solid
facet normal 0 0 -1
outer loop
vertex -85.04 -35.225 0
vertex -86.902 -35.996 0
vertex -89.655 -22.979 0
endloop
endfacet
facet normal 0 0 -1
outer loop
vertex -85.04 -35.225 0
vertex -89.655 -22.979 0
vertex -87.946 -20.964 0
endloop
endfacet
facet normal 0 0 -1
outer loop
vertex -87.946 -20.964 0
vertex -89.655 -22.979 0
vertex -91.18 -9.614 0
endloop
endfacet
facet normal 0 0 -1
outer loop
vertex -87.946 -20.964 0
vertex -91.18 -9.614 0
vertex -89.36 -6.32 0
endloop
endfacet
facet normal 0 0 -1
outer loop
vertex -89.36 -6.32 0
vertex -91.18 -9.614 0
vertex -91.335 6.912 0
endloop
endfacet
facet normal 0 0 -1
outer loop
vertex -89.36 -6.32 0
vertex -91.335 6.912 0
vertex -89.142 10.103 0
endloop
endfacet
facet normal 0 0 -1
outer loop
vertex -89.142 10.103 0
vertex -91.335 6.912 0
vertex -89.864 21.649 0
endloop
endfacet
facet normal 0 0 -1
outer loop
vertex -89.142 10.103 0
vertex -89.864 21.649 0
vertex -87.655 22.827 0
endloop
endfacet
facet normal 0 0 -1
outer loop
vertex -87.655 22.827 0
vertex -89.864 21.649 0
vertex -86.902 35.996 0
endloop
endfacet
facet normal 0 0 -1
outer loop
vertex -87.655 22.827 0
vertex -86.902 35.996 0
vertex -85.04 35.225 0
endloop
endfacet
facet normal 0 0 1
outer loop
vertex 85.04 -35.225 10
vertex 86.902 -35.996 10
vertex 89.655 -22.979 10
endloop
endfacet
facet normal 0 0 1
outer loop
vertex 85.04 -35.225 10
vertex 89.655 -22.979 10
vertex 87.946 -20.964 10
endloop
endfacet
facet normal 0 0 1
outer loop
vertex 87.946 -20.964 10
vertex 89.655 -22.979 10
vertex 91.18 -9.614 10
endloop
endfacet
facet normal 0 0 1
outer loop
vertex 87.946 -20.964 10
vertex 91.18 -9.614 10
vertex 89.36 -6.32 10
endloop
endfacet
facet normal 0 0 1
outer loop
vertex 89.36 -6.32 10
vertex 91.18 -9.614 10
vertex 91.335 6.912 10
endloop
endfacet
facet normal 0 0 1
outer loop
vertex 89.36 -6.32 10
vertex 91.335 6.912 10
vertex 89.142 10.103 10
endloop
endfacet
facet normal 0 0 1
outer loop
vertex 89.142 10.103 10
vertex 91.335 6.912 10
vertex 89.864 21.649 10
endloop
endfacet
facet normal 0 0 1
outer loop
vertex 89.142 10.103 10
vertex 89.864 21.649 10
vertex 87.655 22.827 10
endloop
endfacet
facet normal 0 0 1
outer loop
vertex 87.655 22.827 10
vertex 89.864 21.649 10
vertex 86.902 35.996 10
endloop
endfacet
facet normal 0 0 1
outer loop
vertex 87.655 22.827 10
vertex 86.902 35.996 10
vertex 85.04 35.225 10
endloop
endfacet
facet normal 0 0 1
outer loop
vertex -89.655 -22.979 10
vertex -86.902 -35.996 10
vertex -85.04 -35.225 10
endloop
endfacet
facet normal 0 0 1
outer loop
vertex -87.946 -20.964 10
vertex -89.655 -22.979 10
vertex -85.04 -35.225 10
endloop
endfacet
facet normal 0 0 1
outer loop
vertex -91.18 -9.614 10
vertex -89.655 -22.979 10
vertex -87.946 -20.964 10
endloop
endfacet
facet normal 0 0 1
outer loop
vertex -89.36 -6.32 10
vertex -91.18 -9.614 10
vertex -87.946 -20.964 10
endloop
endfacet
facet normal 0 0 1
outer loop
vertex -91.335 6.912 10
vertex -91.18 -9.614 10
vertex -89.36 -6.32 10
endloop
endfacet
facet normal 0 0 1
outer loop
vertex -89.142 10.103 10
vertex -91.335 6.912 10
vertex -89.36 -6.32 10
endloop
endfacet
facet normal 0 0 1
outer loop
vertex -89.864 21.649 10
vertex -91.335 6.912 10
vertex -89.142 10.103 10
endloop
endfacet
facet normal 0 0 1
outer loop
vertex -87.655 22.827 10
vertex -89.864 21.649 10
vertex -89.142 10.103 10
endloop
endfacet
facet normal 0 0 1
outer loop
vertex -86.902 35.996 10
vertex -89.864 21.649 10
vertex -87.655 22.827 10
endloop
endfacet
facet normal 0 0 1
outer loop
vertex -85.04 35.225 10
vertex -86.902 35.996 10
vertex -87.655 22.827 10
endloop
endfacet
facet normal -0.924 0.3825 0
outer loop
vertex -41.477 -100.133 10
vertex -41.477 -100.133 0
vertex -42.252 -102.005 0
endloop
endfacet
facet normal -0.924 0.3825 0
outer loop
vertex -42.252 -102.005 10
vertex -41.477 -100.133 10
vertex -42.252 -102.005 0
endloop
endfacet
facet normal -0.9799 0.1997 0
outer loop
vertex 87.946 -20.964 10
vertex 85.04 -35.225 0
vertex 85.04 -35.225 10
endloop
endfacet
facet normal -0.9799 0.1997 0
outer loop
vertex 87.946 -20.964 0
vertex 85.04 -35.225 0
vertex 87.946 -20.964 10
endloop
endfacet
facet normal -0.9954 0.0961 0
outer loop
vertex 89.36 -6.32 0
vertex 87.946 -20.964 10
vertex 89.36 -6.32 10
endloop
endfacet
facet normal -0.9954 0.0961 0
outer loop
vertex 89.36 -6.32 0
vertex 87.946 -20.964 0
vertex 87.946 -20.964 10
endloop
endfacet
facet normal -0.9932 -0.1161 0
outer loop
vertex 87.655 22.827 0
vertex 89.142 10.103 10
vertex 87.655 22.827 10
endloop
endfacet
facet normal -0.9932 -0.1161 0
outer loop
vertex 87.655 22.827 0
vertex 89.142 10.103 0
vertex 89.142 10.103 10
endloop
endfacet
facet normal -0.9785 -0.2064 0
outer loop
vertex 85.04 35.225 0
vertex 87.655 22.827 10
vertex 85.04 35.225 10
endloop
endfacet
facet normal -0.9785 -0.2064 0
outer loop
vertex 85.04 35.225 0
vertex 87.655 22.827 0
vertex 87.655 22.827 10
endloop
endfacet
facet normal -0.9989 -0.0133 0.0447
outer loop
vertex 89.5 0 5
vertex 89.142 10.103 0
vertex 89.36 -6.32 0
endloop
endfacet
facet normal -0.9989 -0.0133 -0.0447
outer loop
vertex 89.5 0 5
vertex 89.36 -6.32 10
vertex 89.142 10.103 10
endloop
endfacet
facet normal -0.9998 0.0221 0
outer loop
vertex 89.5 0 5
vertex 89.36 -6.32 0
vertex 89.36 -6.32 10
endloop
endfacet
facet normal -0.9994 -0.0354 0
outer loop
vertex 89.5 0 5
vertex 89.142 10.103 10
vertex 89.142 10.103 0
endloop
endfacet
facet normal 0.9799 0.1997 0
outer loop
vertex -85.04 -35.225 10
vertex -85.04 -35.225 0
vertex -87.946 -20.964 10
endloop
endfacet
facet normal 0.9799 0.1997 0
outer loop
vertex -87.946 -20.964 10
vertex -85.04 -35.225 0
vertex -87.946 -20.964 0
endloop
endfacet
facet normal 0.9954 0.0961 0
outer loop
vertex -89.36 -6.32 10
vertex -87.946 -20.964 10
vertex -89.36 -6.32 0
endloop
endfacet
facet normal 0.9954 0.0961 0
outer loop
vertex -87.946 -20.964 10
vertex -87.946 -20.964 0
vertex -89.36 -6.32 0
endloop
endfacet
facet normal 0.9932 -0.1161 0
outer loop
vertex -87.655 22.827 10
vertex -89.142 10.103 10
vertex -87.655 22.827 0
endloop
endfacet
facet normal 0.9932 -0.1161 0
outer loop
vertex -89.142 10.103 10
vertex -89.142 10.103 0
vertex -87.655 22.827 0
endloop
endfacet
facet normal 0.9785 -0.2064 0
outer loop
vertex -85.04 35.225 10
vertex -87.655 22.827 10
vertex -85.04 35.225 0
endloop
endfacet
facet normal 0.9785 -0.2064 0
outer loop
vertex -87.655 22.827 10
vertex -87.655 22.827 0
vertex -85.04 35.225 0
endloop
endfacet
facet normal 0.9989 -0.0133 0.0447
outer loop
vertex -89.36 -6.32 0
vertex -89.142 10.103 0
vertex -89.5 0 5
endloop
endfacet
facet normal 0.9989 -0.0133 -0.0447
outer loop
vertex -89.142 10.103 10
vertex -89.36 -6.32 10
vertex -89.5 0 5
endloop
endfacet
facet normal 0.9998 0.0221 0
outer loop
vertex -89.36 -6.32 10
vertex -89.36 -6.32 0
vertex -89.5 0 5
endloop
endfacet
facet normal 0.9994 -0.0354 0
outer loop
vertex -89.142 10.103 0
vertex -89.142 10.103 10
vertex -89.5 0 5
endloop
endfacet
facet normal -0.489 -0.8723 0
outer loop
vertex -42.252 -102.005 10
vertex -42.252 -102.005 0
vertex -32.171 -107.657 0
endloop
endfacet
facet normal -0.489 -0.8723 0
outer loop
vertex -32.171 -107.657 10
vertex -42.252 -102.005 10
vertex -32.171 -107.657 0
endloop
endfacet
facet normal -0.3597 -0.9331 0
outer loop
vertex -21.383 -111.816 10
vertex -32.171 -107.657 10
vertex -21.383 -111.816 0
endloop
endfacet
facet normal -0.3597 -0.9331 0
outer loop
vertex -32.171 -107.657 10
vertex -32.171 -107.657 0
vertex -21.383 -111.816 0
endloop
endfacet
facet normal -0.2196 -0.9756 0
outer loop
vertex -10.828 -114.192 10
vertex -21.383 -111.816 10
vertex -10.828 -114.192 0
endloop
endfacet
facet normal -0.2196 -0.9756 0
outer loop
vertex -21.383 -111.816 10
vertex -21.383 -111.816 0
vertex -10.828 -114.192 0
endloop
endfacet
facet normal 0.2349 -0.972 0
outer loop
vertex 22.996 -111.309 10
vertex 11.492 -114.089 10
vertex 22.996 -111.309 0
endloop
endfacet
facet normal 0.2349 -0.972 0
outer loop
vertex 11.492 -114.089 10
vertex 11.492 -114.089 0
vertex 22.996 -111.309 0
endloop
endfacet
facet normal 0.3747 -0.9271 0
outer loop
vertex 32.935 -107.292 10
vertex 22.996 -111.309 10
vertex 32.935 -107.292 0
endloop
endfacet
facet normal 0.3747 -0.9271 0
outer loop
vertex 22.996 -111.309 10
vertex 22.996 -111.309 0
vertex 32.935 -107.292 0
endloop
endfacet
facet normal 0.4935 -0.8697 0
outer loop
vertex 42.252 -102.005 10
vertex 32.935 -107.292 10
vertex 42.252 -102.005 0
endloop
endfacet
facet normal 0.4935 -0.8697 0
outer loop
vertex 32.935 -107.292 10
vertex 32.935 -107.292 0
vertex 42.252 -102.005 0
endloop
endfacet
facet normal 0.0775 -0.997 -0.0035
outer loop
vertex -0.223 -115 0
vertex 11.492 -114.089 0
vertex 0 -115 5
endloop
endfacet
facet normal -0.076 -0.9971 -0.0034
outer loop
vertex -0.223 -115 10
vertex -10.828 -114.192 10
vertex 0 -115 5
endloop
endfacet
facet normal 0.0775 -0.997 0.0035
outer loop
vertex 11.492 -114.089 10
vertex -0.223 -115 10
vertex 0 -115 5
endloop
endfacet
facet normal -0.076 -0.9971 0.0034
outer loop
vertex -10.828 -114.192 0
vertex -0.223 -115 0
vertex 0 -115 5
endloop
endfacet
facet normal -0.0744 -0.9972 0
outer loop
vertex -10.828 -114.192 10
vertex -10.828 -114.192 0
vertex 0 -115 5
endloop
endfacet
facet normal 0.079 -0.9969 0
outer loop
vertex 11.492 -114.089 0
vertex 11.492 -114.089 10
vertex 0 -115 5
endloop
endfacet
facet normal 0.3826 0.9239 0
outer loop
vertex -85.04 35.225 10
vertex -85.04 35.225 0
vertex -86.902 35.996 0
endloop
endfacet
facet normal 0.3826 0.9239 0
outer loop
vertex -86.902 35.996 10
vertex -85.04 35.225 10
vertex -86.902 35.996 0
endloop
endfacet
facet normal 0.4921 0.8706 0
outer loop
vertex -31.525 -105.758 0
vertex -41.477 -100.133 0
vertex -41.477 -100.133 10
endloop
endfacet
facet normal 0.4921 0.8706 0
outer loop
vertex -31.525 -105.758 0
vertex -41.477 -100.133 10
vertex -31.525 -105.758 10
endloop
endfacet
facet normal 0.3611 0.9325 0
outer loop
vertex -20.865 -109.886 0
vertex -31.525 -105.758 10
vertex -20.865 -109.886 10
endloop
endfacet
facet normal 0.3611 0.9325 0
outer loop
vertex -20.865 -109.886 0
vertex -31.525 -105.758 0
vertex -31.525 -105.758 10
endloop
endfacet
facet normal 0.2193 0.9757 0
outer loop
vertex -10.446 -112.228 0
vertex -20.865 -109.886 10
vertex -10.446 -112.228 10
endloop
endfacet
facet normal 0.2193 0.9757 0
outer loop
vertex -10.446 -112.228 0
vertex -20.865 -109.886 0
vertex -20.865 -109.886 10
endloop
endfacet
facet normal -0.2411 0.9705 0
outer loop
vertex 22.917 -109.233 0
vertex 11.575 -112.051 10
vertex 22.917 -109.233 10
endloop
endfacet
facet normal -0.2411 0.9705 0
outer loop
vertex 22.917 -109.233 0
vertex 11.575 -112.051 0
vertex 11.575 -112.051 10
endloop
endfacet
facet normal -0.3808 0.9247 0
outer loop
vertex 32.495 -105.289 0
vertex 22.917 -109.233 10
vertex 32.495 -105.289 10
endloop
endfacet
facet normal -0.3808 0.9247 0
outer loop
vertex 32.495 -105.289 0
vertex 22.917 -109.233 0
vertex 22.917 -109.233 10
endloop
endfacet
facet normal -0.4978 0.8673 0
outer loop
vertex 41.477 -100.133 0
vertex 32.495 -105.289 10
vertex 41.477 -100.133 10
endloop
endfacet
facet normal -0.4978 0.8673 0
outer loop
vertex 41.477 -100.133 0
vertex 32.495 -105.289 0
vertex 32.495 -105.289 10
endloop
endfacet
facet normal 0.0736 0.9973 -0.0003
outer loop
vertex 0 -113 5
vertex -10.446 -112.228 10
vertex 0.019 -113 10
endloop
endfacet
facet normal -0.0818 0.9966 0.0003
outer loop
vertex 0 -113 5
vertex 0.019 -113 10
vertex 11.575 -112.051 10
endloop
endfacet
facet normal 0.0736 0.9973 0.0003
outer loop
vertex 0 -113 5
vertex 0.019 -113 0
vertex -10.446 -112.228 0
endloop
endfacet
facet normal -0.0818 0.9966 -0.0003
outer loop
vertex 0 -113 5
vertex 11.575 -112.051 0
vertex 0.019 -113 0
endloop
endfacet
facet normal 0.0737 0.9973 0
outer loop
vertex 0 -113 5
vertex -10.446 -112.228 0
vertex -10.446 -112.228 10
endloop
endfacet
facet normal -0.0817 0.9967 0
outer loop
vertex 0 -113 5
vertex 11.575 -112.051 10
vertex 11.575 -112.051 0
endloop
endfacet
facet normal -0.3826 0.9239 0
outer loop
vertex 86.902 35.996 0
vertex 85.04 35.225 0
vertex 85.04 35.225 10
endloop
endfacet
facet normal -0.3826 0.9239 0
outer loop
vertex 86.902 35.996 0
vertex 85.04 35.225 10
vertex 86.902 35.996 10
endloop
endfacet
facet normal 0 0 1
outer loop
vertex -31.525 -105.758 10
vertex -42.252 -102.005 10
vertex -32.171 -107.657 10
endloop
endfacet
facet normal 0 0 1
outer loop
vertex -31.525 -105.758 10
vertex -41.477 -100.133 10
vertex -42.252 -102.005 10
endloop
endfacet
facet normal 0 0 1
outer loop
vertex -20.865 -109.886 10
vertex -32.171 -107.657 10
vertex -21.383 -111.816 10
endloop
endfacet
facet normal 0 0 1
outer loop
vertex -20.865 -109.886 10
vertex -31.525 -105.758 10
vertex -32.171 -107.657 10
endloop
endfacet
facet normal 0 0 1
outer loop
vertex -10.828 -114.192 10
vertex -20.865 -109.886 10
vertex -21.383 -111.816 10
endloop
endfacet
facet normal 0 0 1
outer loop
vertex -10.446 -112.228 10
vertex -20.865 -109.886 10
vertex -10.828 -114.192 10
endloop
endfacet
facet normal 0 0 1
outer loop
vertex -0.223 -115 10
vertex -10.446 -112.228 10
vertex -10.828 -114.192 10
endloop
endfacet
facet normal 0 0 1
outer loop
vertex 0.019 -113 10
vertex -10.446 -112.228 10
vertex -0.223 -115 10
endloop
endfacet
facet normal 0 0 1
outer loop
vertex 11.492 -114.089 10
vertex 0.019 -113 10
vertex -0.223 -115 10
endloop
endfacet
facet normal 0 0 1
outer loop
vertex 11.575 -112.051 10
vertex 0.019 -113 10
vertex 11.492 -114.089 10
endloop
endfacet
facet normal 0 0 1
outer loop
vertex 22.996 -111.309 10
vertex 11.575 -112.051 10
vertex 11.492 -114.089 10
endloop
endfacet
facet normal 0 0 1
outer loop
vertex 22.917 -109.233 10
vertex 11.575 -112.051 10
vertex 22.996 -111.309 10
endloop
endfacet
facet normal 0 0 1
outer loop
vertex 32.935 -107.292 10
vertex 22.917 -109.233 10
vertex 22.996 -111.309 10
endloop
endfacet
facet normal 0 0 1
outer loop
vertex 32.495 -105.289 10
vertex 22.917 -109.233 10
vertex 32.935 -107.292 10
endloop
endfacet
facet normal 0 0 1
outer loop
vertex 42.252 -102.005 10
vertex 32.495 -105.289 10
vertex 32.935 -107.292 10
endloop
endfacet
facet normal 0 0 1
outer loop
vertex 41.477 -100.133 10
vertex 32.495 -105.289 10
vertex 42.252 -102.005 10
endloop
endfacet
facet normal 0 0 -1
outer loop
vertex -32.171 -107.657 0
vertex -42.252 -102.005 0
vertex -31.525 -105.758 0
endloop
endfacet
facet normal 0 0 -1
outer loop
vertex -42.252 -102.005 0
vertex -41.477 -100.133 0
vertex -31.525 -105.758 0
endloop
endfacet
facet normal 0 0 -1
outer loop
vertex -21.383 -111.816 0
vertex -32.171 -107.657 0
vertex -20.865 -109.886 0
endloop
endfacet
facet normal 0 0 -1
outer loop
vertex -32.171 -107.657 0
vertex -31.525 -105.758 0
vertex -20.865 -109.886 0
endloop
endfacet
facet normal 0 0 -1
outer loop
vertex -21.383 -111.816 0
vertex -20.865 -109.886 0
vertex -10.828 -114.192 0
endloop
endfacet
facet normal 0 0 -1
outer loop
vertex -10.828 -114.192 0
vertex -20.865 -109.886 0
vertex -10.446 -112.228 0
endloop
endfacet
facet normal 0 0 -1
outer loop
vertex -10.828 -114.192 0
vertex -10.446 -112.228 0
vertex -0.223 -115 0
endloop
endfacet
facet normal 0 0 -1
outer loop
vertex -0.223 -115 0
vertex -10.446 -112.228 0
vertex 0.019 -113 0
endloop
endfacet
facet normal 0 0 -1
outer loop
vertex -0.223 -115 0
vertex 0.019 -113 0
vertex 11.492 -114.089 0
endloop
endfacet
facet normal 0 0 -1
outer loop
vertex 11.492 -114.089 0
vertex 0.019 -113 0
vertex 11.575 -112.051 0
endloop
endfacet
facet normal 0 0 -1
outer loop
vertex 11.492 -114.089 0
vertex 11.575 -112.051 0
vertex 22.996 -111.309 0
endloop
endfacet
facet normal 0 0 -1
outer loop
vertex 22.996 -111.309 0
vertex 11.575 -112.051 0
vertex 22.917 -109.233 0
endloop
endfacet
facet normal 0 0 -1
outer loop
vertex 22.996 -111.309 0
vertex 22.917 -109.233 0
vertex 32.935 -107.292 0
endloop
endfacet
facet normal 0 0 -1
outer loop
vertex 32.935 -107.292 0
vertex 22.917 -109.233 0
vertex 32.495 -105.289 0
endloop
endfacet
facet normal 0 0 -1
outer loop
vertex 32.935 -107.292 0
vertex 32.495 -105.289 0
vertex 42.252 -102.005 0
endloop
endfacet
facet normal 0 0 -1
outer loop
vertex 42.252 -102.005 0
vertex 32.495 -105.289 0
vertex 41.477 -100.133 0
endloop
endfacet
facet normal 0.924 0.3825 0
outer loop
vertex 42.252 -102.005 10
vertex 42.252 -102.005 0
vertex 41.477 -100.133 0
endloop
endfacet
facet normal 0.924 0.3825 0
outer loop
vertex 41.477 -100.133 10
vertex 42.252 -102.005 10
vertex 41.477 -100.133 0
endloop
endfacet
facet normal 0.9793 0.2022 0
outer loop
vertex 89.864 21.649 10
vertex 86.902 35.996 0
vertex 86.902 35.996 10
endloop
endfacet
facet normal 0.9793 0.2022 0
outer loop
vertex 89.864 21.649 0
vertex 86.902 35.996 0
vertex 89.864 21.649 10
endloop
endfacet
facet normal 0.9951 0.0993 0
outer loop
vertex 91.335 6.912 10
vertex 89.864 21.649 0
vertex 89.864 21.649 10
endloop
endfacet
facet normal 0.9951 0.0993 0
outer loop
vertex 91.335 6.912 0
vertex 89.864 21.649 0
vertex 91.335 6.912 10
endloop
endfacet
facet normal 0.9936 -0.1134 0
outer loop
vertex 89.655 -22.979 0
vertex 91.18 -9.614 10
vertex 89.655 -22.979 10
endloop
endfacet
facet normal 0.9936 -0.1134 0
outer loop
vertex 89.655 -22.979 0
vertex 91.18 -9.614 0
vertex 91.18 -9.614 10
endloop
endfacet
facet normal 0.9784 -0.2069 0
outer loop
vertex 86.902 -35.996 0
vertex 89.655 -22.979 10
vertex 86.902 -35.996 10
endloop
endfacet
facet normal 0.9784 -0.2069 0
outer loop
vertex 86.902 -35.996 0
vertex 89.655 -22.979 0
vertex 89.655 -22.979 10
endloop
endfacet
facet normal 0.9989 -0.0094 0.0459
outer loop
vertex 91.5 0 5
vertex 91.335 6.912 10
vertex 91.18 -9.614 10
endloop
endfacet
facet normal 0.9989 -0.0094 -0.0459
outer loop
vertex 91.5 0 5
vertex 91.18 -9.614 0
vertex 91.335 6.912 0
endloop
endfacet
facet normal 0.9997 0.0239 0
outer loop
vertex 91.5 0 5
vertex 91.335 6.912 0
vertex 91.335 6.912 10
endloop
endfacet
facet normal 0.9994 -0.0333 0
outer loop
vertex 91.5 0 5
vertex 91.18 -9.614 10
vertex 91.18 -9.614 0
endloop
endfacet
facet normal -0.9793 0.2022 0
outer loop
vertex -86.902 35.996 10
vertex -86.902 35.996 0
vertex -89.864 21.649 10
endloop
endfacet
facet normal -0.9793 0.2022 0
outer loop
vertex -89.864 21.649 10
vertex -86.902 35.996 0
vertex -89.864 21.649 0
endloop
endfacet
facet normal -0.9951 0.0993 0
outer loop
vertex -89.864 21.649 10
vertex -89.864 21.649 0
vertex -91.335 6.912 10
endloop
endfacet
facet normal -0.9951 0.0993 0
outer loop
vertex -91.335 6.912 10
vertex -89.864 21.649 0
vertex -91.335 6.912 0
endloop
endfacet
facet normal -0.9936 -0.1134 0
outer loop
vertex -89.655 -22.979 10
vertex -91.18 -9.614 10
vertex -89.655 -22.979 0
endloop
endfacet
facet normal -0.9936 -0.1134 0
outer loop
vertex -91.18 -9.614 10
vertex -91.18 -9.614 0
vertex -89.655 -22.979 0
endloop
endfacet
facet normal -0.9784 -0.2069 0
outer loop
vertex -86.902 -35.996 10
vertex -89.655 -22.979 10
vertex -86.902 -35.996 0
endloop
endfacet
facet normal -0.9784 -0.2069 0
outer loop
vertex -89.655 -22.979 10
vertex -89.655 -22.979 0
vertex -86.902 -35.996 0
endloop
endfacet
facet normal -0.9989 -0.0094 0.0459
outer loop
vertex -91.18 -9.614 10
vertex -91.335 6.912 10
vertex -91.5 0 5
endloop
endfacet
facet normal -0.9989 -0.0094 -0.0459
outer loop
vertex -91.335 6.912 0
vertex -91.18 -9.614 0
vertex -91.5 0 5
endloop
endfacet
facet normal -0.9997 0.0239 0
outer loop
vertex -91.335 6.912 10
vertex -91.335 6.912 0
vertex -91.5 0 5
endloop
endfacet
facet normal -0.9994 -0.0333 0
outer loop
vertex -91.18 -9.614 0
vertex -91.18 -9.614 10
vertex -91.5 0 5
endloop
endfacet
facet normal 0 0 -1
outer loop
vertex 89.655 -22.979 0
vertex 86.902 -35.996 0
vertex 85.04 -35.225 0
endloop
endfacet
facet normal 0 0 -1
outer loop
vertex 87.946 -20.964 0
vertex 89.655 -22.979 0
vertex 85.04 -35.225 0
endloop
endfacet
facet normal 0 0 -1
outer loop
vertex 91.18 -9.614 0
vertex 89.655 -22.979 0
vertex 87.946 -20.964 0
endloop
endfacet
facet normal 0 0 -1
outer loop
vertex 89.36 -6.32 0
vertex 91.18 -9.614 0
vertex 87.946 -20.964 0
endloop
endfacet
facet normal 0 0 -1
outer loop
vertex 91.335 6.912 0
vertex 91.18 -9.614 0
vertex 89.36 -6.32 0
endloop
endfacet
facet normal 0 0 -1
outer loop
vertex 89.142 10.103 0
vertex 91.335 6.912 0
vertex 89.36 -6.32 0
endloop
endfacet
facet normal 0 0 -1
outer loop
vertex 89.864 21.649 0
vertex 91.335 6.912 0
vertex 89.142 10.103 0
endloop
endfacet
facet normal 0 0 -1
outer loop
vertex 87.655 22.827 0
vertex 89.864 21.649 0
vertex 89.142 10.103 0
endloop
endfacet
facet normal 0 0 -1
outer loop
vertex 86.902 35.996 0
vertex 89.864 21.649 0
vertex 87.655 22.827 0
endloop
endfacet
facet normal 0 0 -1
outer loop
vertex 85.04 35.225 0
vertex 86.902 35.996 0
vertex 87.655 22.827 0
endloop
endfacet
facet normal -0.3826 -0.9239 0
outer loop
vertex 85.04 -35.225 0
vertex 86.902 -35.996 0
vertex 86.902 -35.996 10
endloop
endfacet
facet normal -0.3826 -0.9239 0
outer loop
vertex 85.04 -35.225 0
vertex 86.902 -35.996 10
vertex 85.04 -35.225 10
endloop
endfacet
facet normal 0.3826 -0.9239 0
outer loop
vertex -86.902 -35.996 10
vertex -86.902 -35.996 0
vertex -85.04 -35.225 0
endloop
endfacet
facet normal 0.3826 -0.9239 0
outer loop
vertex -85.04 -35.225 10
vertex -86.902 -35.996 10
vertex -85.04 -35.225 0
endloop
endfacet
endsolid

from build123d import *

# Parameters (mm, degrees)
F1_DEPTH = 10
F3_DEPTH = 10


with BuildPart() as f1:
    # F0 (on Top) → F1 (new body)
    with BuildSketch(Plane.XY):
        with BuildLine():
            Line((-85.0404330334, 35.2249007125), (-86.9021372912, 35.9960438652))
            add(Edge.make_bspline(
                [(-86.9021372912, 35.9960438652), (-91.5, 18.4618753098), (-91.5, 0)],
                knots=[1.2524366586, 1.2524366586, 1.2524366586, 1.5707963268, 1.5707963268, 1.5707963268], degree=2, weights=[1, 0.9873576187, 1]))
            Line((-91.5, 0), (-89.5, 0))
            add(Edge.make_bspline(
                [(-85.0404330334, 35.2249007125), (-89.5, 18.0624544066), (-89.5, 0)],
                knots=[1.2537885998, 1.2537885998, 1.2537885998, 1.5707963268, 1.5707963268, 1.5707963268], degree=2, weights=[1, 0.9874645402, 1]))
        make_face()
        with BuildLine():
            Line((-89.5, 0), (-91.5, 0))
            add(Edge.make_bspline(
                [(-91.5, 0), (-91.5, -18.4618753098), (-86.9021372912, -35.9960438652)],
                knots=[1.5707963268, 1.5707963268, 1.5707963268, 1.889155995, 1.889155995, 1.889155995], degree=2, weights=[1, 0.9873576187, 1]))
            Line((-86.9021372912, -35.9960438652), (-85.0404330334, -35.2249007125))
            add(Edge.make_bspline(
                [(-89.5, 0), (-89.5, -18.0624544066), (-85.0404330334, -35.2249007125)],
                knots=[1.5707963268, 1.5707963268, 1.5707963268, 1.8878040538, 1.8878040538, 1.8878040538], degree=2, weights=[1, 0.9874645402, 1]))
        make_face()
    extrude(amount=F1_DEPTH)


with BuildPart() as f2_1:
    # F2: instance of F1
    add(f1.part.mirror(Plane.YZ))


with BuildPart() as f3:
    # F0 (on Top) → F3 (new body)
    with BuildSketch(Plane.XY):
        with BuildLine():
            add(Edge.make_bspline(
                [(-42.2518646165, -102.0050245927), (0, -129.6504760702), (42.2518646165, -102.0050245927)],
                knots=[2.6616041117, 2.6616041117, 2.6616041117, 3.6215811955, 3.6215811955, 3.6215811955], degree=2, weights=[1, 0.8870002138, 1]))
            Line((42.2518646165, -102.0050245927), (41.4765912171, -100.1333490373))
            add(Edge.make_bspline(
                [(-41.4765912171, -100.1333490373), (0, -127.5199533699), (41.4765912171, -100.1333490373)],
                knots=[2.6597355721, 2.6597355721, 2.6597355721, 3.6234497351, 3.6234497351, 3.6234497351], degree=2, weights=[1, 0.8861358322, 1]))
            Line((-41.4765912171, -100.1333490373), (-42.2518646165, -102.0050245927))
        make_face()
    extrude(amount=F3_DEPTH)


solid = Compound([f1.part, f2_1.part, f3.part])
